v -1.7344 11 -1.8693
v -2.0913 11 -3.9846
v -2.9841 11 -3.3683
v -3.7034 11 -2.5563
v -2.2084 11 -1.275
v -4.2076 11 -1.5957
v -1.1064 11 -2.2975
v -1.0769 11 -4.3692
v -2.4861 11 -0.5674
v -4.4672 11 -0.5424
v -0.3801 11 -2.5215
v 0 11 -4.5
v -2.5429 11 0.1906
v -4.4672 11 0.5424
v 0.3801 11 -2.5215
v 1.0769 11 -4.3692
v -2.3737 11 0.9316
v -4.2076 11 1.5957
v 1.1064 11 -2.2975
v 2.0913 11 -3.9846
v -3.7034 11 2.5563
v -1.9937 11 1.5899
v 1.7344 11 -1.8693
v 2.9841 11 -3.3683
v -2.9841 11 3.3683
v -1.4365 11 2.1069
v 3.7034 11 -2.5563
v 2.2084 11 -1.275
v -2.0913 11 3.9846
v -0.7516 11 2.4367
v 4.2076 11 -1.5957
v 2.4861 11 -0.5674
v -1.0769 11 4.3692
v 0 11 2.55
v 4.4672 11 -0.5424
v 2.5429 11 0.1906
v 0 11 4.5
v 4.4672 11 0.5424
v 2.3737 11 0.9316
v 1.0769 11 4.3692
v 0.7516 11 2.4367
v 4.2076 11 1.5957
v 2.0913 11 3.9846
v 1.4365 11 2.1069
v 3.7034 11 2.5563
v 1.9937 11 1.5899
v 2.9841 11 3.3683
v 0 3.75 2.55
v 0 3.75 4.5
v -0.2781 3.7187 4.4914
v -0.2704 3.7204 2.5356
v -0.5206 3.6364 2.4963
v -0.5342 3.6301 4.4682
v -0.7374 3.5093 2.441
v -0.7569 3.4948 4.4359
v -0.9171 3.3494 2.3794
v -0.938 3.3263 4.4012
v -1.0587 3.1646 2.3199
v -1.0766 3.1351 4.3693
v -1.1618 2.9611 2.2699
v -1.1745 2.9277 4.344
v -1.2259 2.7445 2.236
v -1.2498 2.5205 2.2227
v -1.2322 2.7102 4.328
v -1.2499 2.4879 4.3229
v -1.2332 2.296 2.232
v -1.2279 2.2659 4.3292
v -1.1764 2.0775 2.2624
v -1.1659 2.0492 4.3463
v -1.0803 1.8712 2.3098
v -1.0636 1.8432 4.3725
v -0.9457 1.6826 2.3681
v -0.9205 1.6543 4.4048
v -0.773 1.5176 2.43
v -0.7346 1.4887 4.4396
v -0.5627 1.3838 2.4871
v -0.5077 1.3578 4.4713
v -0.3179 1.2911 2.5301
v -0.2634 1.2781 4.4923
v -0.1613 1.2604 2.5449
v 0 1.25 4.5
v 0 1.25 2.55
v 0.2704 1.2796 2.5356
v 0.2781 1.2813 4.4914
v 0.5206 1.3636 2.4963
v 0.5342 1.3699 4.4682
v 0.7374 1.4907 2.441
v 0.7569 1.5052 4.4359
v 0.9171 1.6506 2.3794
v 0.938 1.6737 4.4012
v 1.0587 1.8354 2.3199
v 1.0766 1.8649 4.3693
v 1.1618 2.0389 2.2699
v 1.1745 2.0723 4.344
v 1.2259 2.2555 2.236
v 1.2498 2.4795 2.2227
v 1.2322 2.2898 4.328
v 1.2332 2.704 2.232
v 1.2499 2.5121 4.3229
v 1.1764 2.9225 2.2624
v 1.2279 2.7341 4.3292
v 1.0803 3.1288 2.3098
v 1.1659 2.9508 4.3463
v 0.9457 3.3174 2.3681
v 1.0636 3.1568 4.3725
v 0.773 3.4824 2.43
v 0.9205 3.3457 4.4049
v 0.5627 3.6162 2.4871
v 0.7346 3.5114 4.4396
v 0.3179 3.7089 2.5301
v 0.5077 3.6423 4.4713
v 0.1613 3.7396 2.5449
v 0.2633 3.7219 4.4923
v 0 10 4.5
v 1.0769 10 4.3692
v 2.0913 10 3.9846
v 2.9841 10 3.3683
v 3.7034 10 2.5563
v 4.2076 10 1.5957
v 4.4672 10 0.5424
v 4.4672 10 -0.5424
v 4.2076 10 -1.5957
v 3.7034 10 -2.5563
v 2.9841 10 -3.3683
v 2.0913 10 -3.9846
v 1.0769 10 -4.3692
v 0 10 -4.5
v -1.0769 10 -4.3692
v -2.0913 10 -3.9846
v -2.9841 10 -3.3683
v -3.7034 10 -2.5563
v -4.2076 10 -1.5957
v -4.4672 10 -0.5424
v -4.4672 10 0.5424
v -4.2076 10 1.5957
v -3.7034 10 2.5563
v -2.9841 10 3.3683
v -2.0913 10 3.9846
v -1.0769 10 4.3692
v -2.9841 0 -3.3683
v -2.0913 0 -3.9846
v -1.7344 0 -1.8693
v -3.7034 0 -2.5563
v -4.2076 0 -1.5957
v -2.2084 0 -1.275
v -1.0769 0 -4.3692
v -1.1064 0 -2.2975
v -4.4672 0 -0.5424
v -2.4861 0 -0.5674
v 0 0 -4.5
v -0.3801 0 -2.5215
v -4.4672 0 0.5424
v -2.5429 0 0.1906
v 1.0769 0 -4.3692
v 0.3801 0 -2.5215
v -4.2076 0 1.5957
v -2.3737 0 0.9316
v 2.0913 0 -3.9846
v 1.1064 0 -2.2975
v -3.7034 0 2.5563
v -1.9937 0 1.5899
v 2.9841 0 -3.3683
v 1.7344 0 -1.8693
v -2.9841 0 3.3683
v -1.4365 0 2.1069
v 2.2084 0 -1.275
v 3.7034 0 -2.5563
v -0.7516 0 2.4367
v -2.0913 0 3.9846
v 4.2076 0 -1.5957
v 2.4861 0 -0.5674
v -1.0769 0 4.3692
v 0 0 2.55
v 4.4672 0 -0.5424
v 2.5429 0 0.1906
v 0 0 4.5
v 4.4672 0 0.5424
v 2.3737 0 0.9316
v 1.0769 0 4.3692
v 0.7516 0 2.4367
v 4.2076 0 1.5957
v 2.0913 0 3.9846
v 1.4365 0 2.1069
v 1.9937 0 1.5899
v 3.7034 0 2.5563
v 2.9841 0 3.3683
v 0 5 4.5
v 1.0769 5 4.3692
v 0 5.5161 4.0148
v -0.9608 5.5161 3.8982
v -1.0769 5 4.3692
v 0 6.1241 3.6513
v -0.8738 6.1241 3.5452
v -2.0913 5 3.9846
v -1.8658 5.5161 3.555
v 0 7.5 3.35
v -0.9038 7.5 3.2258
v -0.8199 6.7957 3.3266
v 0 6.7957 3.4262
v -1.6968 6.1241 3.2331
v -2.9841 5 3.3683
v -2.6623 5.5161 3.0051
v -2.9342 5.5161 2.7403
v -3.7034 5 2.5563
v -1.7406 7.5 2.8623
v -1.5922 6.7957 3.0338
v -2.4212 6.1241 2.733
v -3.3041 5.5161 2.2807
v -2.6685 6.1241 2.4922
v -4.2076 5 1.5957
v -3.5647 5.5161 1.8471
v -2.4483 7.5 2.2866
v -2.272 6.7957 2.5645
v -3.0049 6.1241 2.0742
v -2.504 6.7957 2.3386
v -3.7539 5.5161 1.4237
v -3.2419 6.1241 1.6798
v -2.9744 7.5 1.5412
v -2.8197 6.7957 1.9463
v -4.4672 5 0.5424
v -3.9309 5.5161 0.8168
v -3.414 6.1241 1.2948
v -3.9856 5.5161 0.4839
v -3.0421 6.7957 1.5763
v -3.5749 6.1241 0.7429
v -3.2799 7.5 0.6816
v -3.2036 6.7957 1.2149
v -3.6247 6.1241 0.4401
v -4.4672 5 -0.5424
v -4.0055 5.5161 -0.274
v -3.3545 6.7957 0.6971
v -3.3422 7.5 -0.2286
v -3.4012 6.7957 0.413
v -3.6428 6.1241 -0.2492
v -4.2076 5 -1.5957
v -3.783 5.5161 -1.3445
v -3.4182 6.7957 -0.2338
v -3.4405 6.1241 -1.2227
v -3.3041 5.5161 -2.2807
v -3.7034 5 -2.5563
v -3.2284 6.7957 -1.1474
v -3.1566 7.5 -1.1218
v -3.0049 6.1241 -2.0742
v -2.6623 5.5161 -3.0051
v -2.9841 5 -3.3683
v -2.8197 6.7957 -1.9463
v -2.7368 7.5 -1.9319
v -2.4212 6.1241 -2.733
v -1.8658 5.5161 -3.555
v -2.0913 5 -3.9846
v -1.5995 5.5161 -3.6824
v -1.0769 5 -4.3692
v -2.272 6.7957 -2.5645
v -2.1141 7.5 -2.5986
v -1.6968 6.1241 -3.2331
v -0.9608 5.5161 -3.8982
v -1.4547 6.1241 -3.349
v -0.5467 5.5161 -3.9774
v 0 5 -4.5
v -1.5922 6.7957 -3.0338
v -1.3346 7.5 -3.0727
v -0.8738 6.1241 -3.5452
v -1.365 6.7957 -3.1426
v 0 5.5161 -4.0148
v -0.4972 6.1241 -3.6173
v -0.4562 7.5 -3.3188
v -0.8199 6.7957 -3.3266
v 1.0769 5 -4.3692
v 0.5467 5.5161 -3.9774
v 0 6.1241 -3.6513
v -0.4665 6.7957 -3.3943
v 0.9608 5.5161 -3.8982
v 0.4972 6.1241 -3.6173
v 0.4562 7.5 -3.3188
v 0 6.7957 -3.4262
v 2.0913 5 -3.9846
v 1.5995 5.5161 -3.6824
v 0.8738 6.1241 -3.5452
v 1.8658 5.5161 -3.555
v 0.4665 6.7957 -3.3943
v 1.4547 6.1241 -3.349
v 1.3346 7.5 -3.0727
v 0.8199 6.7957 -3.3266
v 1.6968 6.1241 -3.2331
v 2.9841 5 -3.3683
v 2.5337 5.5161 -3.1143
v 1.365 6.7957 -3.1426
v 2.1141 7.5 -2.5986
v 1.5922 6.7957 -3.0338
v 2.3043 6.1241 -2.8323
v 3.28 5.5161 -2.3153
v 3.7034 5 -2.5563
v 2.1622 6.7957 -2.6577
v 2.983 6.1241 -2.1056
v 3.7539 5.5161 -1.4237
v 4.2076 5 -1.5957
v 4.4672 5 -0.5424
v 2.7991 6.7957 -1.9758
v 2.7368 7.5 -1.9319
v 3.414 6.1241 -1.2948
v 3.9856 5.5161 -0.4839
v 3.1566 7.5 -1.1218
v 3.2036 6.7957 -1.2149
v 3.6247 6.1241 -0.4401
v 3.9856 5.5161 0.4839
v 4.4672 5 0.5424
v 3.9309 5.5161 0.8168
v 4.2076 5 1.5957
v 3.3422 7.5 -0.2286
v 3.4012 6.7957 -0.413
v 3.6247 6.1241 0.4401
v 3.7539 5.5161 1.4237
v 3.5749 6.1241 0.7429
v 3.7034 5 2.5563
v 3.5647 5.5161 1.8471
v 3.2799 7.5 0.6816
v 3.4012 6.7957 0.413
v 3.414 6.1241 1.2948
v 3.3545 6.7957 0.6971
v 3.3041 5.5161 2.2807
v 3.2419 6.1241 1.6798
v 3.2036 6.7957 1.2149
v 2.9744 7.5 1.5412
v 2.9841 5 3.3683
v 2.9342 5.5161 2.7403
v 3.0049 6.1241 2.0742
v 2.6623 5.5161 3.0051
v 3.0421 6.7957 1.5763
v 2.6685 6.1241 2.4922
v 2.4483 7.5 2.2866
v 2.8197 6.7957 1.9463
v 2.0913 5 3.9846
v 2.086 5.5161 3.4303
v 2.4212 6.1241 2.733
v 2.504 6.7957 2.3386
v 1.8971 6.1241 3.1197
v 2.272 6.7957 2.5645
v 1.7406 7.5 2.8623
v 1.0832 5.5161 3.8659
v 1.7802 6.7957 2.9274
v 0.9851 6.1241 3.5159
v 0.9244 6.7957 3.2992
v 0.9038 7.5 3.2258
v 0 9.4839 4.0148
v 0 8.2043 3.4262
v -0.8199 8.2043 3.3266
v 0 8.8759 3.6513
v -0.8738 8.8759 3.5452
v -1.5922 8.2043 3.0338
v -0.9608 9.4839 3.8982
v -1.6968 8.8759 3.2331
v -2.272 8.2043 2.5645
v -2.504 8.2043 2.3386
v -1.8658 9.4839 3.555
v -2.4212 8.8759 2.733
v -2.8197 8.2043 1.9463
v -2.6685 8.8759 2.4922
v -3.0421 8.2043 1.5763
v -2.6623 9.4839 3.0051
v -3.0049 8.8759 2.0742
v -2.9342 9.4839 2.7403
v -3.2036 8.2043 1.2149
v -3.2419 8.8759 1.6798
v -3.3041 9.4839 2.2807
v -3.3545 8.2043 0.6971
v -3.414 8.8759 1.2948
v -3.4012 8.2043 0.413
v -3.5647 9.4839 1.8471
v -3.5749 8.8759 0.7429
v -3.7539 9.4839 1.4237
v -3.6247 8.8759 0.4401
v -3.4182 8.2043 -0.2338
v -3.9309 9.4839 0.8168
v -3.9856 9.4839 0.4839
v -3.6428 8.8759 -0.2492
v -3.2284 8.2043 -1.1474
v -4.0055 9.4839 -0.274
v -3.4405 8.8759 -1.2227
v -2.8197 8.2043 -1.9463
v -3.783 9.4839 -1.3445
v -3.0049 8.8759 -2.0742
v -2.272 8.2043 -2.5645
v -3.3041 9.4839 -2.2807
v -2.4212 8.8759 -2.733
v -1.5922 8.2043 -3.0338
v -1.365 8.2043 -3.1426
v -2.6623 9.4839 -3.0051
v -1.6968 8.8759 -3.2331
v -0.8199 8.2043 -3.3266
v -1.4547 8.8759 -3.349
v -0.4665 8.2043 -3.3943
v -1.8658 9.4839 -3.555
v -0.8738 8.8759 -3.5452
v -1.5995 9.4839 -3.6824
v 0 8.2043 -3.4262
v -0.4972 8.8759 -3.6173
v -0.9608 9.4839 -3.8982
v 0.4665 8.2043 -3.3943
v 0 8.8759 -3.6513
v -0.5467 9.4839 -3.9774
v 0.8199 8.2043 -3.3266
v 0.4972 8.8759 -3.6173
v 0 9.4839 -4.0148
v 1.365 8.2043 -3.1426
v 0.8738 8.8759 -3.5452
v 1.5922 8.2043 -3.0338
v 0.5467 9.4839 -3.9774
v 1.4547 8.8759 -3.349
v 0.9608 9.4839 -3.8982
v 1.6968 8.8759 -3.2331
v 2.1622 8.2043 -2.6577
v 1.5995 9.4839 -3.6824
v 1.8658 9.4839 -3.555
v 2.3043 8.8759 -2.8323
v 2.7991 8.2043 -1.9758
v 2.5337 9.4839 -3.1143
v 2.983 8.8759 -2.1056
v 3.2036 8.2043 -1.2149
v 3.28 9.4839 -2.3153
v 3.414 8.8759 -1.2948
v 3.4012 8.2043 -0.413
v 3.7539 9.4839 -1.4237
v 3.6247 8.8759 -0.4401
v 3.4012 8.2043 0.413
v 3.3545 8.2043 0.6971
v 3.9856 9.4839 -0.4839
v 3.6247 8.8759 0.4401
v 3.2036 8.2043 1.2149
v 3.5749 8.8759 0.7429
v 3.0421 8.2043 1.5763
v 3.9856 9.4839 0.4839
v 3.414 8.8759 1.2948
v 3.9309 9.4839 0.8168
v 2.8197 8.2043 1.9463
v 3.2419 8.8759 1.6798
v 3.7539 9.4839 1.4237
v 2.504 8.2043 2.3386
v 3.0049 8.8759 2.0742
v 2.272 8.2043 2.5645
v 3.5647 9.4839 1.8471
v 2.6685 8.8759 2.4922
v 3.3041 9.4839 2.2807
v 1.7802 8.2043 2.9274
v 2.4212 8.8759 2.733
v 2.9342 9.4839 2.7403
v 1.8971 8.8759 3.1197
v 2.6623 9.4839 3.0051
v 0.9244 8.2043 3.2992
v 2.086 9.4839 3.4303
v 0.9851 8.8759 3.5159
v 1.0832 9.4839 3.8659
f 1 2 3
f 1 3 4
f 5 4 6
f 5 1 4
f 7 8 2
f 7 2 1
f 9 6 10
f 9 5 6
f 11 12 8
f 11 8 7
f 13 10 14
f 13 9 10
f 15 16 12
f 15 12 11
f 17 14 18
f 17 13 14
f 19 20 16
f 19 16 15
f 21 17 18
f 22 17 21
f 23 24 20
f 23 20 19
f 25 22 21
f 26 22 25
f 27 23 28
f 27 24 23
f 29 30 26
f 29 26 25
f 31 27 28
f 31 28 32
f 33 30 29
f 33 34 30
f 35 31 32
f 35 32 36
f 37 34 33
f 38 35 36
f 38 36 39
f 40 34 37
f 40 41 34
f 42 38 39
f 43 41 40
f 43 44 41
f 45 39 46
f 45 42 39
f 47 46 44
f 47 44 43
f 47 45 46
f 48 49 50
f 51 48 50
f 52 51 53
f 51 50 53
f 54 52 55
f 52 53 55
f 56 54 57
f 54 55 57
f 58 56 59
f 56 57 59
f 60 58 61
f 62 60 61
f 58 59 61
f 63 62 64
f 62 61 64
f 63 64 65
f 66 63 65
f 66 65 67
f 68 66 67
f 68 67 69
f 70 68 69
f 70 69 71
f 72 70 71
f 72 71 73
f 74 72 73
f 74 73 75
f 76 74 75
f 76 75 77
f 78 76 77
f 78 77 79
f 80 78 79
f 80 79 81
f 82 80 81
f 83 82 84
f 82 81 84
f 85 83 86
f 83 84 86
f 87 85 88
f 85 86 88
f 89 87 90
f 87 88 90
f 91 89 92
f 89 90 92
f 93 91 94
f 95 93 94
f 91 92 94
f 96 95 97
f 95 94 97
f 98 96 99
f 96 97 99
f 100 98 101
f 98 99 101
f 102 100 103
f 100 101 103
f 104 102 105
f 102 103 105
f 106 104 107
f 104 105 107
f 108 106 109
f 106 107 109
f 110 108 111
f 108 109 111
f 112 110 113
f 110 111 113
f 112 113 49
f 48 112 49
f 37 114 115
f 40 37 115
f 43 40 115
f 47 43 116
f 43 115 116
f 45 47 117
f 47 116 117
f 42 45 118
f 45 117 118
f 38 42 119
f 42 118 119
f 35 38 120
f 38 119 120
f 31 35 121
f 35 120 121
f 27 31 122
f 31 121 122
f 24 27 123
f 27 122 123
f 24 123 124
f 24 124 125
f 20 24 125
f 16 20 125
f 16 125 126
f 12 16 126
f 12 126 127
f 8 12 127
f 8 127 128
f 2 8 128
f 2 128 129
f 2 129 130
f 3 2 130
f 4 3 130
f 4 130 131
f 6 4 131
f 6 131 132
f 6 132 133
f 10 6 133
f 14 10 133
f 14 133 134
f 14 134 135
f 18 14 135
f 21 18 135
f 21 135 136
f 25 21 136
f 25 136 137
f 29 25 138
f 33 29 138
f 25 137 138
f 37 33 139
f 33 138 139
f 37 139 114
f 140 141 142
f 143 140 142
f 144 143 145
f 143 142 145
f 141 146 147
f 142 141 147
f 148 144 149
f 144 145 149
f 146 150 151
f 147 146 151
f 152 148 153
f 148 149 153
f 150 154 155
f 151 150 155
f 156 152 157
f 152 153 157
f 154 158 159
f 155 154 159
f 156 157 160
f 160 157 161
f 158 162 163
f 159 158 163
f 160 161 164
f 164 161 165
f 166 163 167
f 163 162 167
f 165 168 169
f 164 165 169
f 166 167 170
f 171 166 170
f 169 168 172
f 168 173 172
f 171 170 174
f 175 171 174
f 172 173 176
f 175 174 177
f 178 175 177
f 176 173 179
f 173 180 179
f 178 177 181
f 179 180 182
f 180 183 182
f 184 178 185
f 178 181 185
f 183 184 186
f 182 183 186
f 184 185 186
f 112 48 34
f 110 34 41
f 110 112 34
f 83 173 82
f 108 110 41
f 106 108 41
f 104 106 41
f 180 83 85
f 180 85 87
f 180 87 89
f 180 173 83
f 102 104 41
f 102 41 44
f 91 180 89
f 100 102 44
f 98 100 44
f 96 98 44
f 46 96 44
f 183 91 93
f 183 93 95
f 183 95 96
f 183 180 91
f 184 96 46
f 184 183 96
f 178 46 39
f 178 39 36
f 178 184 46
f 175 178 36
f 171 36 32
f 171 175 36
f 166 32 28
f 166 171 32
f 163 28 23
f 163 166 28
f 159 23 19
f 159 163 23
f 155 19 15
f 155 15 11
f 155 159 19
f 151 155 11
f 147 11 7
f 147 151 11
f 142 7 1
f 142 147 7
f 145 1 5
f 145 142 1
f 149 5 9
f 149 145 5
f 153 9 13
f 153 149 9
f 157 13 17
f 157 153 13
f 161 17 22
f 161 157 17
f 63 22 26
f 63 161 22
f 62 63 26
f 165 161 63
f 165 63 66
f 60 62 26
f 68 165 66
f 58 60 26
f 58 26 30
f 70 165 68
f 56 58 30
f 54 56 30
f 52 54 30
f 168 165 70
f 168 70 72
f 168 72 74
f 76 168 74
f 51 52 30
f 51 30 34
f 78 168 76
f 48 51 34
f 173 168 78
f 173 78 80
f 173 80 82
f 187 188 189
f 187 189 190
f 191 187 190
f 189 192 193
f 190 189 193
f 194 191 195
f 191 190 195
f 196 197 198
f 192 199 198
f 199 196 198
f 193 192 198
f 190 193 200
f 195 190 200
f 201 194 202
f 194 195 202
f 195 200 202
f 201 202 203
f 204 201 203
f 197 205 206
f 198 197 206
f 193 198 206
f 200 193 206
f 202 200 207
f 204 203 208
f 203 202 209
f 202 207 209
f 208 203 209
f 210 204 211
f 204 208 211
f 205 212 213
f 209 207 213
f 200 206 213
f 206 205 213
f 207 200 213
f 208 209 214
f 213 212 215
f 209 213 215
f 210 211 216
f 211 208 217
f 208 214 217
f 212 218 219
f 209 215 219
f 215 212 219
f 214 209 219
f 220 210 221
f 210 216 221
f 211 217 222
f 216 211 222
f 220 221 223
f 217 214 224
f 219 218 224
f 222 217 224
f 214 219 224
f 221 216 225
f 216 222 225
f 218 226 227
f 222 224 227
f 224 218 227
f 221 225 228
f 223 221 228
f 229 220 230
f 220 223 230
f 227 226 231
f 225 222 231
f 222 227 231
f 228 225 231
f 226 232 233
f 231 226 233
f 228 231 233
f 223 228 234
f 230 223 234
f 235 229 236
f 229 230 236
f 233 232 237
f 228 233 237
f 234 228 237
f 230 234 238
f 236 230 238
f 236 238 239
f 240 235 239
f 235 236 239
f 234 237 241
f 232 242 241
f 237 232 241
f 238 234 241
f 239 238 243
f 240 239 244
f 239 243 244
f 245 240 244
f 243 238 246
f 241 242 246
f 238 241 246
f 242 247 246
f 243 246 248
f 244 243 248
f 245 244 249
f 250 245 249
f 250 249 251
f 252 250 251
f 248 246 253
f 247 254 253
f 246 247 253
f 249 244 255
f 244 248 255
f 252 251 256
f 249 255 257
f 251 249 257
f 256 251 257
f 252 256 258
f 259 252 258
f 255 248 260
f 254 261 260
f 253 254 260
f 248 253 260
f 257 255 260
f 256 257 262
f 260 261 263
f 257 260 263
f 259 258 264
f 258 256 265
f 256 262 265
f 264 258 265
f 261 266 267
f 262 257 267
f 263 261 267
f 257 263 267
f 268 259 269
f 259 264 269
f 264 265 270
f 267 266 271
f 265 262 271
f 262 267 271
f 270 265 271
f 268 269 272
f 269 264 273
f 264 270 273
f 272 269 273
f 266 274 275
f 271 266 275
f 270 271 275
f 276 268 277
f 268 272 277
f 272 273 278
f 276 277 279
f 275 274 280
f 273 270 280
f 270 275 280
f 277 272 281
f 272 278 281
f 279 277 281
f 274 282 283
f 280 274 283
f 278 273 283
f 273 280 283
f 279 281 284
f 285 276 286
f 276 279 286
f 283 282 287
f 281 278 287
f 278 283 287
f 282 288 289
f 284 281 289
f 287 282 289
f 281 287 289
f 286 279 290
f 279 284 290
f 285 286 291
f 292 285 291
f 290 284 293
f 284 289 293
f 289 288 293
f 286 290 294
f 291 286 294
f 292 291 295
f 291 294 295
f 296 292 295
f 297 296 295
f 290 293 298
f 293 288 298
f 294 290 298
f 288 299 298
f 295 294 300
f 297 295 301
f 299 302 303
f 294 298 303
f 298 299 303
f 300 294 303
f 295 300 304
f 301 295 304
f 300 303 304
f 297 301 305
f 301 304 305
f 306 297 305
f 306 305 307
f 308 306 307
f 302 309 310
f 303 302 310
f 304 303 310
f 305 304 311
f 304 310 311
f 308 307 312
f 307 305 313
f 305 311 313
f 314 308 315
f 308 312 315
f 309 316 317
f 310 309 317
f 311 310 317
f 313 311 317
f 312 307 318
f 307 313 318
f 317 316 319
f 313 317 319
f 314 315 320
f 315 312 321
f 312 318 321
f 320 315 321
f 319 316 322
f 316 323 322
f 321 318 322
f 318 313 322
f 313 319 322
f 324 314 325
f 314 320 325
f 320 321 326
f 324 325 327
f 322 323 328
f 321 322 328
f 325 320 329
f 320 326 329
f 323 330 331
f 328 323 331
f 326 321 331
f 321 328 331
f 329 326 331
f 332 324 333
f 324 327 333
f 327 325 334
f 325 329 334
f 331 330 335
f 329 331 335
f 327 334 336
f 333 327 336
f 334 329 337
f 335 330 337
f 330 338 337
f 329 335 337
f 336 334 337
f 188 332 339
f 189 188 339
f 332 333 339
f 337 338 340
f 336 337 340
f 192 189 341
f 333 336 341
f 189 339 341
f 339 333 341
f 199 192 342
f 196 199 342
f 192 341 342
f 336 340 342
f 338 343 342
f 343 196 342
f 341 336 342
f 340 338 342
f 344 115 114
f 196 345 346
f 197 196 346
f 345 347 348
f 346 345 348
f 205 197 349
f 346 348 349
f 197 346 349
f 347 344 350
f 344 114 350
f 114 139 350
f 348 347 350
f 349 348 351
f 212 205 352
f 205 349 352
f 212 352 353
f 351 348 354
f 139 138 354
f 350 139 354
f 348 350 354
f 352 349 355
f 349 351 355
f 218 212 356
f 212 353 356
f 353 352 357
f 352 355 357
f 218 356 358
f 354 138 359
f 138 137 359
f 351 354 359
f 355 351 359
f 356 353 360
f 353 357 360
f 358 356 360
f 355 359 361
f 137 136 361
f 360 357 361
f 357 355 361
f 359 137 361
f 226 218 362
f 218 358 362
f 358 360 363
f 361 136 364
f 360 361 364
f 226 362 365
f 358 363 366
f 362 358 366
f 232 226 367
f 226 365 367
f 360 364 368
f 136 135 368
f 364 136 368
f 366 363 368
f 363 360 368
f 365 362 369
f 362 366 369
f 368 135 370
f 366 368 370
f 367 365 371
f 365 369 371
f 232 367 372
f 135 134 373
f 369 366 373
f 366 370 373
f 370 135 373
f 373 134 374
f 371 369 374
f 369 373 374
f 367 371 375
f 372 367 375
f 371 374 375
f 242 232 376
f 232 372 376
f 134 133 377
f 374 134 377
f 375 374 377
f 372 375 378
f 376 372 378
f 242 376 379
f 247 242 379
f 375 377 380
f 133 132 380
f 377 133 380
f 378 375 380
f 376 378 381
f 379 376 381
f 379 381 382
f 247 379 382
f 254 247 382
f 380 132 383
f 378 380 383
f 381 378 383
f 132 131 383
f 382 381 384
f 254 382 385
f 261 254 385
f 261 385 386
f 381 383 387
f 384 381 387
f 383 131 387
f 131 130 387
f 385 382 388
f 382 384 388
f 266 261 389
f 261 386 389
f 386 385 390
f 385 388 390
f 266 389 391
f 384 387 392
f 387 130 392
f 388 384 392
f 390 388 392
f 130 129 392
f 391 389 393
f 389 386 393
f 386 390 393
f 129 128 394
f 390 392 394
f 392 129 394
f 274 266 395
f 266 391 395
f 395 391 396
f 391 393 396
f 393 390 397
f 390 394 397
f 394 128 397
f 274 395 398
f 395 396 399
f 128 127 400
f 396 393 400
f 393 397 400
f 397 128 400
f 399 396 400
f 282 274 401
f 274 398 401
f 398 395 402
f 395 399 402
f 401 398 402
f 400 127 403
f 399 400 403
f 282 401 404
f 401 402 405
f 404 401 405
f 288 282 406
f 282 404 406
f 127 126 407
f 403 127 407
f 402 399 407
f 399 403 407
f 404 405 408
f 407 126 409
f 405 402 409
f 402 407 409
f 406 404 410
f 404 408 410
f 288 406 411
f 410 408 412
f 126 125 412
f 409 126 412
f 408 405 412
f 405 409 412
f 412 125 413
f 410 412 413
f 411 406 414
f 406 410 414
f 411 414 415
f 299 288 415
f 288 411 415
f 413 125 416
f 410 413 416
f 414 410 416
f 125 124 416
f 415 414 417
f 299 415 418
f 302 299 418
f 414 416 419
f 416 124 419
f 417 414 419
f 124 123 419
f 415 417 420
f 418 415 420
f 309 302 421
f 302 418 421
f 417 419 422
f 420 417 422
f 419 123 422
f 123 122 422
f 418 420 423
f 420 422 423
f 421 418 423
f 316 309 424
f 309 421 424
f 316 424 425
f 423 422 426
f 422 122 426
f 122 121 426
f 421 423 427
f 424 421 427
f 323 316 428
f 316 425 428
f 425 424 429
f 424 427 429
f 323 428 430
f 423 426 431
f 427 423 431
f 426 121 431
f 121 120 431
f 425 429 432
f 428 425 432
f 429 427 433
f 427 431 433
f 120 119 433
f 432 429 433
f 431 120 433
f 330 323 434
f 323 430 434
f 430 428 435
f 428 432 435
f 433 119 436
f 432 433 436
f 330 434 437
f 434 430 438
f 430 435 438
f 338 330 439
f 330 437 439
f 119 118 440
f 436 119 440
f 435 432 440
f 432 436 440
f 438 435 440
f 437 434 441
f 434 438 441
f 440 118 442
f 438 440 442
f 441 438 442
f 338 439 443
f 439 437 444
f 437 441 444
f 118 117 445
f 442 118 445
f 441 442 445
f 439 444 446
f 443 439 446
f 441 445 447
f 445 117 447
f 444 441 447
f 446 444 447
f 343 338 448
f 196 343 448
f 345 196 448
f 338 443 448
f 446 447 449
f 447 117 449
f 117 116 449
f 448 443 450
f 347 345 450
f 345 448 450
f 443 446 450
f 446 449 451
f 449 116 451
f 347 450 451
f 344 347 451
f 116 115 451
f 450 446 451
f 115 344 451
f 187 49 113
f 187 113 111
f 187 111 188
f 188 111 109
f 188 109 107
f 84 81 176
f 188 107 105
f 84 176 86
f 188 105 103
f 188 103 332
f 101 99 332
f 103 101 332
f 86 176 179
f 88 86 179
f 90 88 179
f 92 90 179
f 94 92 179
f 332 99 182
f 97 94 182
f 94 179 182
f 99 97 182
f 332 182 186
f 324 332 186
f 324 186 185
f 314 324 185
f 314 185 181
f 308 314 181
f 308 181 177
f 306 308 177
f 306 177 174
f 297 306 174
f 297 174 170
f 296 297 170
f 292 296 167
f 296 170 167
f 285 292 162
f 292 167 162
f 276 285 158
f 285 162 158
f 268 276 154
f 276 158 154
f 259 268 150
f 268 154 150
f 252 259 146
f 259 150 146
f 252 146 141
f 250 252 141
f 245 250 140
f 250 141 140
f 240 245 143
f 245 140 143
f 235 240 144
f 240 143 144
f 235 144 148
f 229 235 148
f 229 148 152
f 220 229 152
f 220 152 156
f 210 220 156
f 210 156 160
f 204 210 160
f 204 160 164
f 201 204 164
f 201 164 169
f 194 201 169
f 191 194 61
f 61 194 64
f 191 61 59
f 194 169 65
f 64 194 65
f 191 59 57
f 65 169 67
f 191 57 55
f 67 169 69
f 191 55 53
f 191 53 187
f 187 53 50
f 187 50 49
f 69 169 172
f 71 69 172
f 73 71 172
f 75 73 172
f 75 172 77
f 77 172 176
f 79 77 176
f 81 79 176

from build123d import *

# Parameters (mm, degrees)
CROQUIS1_R              = 4.5
CROQUIS1_R_2            = 2.55
SALIENTE_EXTRUIR1_DEPTH = 11
CROQUIS3_R              = 3.292391304
CROQUIS5_W              = 1.25
CROQUIS5_H              = 4.5


with BuildPart() as part:
    # Croquis1 → Saliente-Extruir1 (new body)
    with BuildSketch(Plane(origin=(0, 0, 0), x_dir=(1, 0, 0), z_dir=(0, 1, 0))):
        with Locations(Location((0, 0, 0), (0, 0, 270))):
            Circle(CROQUIS1_R)
        with Locations(Location((0, 0, 0), (0, 0, 270))):
            Circle(CROQUIS1_R_2, mode=Mode.SUBTRACT)
    extrude(amount=SALIENTE_EXTRUIR1_DEPTH)

    # Croquis3 → Cortar-Revolución1 (revolve, cut)
    with BuildSketch(Plane(origin=(0, 0, 0), x_dir=(0, 0, -1), z_dir=(1, 0, 0))):
        with Locations((-6.642391304, 7.5)):
            Circle(CROQUIS3_R)
    revolve(axis=Axis((0, 11, 0), (0, -1, 0)), mode=Mode.SUBTRACT)

    # Croquis5 → Taladro roscado M31 (revolve, cut)
    with BuildSketch(Plane(origin=(0, 2.5, 0), x_dir=(0, 1, 0), z_dir=(1, 0, 0))):
        with Locations((0.625, 2.25)):
            Rectangle(CROQUIS5_W, CROQUIS5_H)
    revolve(axis=Axis((0, 2.5, -6.35), (0, 0, 1)), mode=Mode.SUBTRACT)


solid = part.part
